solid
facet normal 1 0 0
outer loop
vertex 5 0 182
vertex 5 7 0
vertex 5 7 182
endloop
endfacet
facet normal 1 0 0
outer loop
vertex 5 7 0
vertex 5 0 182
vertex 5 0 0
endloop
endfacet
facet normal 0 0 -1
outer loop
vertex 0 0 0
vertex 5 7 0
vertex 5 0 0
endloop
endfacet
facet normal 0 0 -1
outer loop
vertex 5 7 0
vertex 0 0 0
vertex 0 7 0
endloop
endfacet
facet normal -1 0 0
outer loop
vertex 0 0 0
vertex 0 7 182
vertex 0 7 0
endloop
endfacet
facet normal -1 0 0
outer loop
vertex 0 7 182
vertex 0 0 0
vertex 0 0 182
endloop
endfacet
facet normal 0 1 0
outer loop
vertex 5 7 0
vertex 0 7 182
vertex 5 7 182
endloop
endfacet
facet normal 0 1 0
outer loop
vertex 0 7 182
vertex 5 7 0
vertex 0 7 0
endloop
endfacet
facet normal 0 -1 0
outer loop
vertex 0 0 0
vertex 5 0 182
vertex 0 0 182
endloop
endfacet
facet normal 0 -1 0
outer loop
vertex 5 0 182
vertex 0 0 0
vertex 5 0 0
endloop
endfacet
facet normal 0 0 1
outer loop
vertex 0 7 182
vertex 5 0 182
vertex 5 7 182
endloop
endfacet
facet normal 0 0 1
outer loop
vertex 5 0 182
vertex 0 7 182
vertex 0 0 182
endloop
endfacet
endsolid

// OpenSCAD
translate([2.5, 3.5, 5.5]) color([0.4059068831679489, 0.6799294831100022, 0.8776565829010952]) cube([5, 7, 11], center=true);
translate([2.5, 3.5, 16.5]) color([0.49540592491118873, 0.9170466727598151, 0.3224603148813061]) cube([5, 7, 11], center=true);
translate([2.5, 3.5, 27.5]) color([0.4984408914907503, 0.4986465918650089, 0.6700681513152942]) cube([5, 7, 11], center=true);
translate([2.5, 3.5, 38.5]) color([0.2019913087994536, 0.6097706104167804, 0.21877309687215574]) cube([5, 7, 11], center=true);
translate([2.5, 3.5, 49.5]) color([0.340220315051032, 0.9625664632546818, 0.8990080380310076]) cube([5, 7, 11], center=true);
translate([2.5, 3.5, 60.5]) color([0.8181183809177941, 0.035468261876012264, 0.14836688246192975]) cube([5, 7, 11], center=true);
translate([2.5, 3.5, 71.5]) color([0.2568819120719038, 0.7841665681891542, 0.8423333270773672]) cube([5, 7, 11], center=true);
translate([2.5, 3.5, 82.5]) color([0.5829481802462215, 0.7181316517768294, 0.8070553799750758]) cube([5, 7, 11], center=true);
translate([2.5, 3.5, 93.5]) color([0.06635913103778524, 0.08464313683307012, 0.8688953140043785]) cube([5, 7, 11], center=true);
translate([2.5, 3.5, 104.5]) color([0.03941582937802879, 0.22509065367649606, 0.04063202664590093]) cube([5, 7, 11], center=true);
translate([2.5, 3.5, 115.5]) color([0.015285139969726802, 0.8439546856924078, 0.3305943672500803]) cube([5, 7, 11], center=true);
translate([2.5, 3.5, 126.5]) color([0.1606900602627206, 0.1488194902889095, 0.656083661770337]) cube([5, 7, 11], center=true);
translate([2.5, 3.5, 137.5]) color([0.9685982716927071, 0.5049996926056783, 0.9010904768840049]) cube([5, 7, 11], center=true);
translate([2.5, 3.5, 144.5]) color([0.5024285989524275, 0.5738724774915492, 0.6785713567893591]) cube([5, 7, 3], center=true);
translate([2.5, 3.5, 147.5]) color([0.805109989032137, 0.7578463822613826, 0.9905325627055622]) cube([5, 7, 3], center=true);
translate([2.5, 3.5, 150.5]) color([0.7469653891501328, 0.9057807233528663, 0.20610483206558328]) cube([5, 7, 3], center=true);
translate([2.5, 3.5, 153.5]) color([0.535416304328581, 0.5986142636674691, 0.8256966171603538]) cube([5, 7, 3], center=true);
translate([2.5, 3.5, 156.5]) color([0.4822135630659161, 0.7910402117090956, 0.3885688901501142]) cube([5, 7, 3], center=true);
translate([2.5, 3.5, 159.5]) color([0.5863884555814496, 0.8513166074810679, 0.7980594711041583]) cube([5, 7, 3], center=true);
translate([2.5, 3.5, 162.5]) color([0.6569845518861341, 0.00024069652516689466, 0.18196892218621108]) cube([5, 7, 3], center=true);
translate([2.5, 3.5, 165.5]) color([0.5068577868511277, 0.2544593984833793, 0.06562084327273077]) cube([5, 7, 3], center=true);
translate([2.5, 3.5, 168.5]) color([0.8598834221214616, 0.9429470213131631, 0.3028048781490337]) cube([5, 7, 3], center=true);
translate([2.5, 3.5, 171.5]) color([0.40807316738486077, 0.8100375338172869, 0.06225875887122312]) cube([5, 7, 3], center=true);
translate([2.5, 3.5, 174.5]) color([0.6409848625624502, 0.12732081293278708, 0.2870883399952252]) cube([5, 7, 3], center=true);
translate([2.5, 1.5, 177.0]) color([0.829940686628406, 0.0555270458896614, 0.035933833430188966]) cube([5, 3, 2], center=true);
translate([2.5, 1.5, 179.0]) color([0.4178660447962945, 0.49183095909626395, 0.8633251831082008]) cube([5, 3, 2], center=true);
translate([2.5, 1.5, 181.0]) color([0.7171887463451895, 0.6735438085995347, 0.15137377239978678]) cube([5, 3, 2], center=true);
translate([2.5, 4.0, 177.5]) color([0.9867059242186832, 0.41114019628748133, 0.6117708643248599]) cube([5, 2, 3], center=true);
translate([2.5, 4.0, 180.5]) color([0.38668300553323576, 0.04703291581184044, 0.4708892090480652]) cube([5, 2, 3], center=true);
translate([2.5, 6.0, 177.5]) color([0.15136775389483625, 0.03246546237394399, 0.6174004236810055]) cube([5, 2, 3], center=true);
translate([2.5, 6.0, 180.5]) color([0.6299662912183356, 0.10529282465636491, 0.5491437662317772]) cube([5, 2, 3], center=true);
